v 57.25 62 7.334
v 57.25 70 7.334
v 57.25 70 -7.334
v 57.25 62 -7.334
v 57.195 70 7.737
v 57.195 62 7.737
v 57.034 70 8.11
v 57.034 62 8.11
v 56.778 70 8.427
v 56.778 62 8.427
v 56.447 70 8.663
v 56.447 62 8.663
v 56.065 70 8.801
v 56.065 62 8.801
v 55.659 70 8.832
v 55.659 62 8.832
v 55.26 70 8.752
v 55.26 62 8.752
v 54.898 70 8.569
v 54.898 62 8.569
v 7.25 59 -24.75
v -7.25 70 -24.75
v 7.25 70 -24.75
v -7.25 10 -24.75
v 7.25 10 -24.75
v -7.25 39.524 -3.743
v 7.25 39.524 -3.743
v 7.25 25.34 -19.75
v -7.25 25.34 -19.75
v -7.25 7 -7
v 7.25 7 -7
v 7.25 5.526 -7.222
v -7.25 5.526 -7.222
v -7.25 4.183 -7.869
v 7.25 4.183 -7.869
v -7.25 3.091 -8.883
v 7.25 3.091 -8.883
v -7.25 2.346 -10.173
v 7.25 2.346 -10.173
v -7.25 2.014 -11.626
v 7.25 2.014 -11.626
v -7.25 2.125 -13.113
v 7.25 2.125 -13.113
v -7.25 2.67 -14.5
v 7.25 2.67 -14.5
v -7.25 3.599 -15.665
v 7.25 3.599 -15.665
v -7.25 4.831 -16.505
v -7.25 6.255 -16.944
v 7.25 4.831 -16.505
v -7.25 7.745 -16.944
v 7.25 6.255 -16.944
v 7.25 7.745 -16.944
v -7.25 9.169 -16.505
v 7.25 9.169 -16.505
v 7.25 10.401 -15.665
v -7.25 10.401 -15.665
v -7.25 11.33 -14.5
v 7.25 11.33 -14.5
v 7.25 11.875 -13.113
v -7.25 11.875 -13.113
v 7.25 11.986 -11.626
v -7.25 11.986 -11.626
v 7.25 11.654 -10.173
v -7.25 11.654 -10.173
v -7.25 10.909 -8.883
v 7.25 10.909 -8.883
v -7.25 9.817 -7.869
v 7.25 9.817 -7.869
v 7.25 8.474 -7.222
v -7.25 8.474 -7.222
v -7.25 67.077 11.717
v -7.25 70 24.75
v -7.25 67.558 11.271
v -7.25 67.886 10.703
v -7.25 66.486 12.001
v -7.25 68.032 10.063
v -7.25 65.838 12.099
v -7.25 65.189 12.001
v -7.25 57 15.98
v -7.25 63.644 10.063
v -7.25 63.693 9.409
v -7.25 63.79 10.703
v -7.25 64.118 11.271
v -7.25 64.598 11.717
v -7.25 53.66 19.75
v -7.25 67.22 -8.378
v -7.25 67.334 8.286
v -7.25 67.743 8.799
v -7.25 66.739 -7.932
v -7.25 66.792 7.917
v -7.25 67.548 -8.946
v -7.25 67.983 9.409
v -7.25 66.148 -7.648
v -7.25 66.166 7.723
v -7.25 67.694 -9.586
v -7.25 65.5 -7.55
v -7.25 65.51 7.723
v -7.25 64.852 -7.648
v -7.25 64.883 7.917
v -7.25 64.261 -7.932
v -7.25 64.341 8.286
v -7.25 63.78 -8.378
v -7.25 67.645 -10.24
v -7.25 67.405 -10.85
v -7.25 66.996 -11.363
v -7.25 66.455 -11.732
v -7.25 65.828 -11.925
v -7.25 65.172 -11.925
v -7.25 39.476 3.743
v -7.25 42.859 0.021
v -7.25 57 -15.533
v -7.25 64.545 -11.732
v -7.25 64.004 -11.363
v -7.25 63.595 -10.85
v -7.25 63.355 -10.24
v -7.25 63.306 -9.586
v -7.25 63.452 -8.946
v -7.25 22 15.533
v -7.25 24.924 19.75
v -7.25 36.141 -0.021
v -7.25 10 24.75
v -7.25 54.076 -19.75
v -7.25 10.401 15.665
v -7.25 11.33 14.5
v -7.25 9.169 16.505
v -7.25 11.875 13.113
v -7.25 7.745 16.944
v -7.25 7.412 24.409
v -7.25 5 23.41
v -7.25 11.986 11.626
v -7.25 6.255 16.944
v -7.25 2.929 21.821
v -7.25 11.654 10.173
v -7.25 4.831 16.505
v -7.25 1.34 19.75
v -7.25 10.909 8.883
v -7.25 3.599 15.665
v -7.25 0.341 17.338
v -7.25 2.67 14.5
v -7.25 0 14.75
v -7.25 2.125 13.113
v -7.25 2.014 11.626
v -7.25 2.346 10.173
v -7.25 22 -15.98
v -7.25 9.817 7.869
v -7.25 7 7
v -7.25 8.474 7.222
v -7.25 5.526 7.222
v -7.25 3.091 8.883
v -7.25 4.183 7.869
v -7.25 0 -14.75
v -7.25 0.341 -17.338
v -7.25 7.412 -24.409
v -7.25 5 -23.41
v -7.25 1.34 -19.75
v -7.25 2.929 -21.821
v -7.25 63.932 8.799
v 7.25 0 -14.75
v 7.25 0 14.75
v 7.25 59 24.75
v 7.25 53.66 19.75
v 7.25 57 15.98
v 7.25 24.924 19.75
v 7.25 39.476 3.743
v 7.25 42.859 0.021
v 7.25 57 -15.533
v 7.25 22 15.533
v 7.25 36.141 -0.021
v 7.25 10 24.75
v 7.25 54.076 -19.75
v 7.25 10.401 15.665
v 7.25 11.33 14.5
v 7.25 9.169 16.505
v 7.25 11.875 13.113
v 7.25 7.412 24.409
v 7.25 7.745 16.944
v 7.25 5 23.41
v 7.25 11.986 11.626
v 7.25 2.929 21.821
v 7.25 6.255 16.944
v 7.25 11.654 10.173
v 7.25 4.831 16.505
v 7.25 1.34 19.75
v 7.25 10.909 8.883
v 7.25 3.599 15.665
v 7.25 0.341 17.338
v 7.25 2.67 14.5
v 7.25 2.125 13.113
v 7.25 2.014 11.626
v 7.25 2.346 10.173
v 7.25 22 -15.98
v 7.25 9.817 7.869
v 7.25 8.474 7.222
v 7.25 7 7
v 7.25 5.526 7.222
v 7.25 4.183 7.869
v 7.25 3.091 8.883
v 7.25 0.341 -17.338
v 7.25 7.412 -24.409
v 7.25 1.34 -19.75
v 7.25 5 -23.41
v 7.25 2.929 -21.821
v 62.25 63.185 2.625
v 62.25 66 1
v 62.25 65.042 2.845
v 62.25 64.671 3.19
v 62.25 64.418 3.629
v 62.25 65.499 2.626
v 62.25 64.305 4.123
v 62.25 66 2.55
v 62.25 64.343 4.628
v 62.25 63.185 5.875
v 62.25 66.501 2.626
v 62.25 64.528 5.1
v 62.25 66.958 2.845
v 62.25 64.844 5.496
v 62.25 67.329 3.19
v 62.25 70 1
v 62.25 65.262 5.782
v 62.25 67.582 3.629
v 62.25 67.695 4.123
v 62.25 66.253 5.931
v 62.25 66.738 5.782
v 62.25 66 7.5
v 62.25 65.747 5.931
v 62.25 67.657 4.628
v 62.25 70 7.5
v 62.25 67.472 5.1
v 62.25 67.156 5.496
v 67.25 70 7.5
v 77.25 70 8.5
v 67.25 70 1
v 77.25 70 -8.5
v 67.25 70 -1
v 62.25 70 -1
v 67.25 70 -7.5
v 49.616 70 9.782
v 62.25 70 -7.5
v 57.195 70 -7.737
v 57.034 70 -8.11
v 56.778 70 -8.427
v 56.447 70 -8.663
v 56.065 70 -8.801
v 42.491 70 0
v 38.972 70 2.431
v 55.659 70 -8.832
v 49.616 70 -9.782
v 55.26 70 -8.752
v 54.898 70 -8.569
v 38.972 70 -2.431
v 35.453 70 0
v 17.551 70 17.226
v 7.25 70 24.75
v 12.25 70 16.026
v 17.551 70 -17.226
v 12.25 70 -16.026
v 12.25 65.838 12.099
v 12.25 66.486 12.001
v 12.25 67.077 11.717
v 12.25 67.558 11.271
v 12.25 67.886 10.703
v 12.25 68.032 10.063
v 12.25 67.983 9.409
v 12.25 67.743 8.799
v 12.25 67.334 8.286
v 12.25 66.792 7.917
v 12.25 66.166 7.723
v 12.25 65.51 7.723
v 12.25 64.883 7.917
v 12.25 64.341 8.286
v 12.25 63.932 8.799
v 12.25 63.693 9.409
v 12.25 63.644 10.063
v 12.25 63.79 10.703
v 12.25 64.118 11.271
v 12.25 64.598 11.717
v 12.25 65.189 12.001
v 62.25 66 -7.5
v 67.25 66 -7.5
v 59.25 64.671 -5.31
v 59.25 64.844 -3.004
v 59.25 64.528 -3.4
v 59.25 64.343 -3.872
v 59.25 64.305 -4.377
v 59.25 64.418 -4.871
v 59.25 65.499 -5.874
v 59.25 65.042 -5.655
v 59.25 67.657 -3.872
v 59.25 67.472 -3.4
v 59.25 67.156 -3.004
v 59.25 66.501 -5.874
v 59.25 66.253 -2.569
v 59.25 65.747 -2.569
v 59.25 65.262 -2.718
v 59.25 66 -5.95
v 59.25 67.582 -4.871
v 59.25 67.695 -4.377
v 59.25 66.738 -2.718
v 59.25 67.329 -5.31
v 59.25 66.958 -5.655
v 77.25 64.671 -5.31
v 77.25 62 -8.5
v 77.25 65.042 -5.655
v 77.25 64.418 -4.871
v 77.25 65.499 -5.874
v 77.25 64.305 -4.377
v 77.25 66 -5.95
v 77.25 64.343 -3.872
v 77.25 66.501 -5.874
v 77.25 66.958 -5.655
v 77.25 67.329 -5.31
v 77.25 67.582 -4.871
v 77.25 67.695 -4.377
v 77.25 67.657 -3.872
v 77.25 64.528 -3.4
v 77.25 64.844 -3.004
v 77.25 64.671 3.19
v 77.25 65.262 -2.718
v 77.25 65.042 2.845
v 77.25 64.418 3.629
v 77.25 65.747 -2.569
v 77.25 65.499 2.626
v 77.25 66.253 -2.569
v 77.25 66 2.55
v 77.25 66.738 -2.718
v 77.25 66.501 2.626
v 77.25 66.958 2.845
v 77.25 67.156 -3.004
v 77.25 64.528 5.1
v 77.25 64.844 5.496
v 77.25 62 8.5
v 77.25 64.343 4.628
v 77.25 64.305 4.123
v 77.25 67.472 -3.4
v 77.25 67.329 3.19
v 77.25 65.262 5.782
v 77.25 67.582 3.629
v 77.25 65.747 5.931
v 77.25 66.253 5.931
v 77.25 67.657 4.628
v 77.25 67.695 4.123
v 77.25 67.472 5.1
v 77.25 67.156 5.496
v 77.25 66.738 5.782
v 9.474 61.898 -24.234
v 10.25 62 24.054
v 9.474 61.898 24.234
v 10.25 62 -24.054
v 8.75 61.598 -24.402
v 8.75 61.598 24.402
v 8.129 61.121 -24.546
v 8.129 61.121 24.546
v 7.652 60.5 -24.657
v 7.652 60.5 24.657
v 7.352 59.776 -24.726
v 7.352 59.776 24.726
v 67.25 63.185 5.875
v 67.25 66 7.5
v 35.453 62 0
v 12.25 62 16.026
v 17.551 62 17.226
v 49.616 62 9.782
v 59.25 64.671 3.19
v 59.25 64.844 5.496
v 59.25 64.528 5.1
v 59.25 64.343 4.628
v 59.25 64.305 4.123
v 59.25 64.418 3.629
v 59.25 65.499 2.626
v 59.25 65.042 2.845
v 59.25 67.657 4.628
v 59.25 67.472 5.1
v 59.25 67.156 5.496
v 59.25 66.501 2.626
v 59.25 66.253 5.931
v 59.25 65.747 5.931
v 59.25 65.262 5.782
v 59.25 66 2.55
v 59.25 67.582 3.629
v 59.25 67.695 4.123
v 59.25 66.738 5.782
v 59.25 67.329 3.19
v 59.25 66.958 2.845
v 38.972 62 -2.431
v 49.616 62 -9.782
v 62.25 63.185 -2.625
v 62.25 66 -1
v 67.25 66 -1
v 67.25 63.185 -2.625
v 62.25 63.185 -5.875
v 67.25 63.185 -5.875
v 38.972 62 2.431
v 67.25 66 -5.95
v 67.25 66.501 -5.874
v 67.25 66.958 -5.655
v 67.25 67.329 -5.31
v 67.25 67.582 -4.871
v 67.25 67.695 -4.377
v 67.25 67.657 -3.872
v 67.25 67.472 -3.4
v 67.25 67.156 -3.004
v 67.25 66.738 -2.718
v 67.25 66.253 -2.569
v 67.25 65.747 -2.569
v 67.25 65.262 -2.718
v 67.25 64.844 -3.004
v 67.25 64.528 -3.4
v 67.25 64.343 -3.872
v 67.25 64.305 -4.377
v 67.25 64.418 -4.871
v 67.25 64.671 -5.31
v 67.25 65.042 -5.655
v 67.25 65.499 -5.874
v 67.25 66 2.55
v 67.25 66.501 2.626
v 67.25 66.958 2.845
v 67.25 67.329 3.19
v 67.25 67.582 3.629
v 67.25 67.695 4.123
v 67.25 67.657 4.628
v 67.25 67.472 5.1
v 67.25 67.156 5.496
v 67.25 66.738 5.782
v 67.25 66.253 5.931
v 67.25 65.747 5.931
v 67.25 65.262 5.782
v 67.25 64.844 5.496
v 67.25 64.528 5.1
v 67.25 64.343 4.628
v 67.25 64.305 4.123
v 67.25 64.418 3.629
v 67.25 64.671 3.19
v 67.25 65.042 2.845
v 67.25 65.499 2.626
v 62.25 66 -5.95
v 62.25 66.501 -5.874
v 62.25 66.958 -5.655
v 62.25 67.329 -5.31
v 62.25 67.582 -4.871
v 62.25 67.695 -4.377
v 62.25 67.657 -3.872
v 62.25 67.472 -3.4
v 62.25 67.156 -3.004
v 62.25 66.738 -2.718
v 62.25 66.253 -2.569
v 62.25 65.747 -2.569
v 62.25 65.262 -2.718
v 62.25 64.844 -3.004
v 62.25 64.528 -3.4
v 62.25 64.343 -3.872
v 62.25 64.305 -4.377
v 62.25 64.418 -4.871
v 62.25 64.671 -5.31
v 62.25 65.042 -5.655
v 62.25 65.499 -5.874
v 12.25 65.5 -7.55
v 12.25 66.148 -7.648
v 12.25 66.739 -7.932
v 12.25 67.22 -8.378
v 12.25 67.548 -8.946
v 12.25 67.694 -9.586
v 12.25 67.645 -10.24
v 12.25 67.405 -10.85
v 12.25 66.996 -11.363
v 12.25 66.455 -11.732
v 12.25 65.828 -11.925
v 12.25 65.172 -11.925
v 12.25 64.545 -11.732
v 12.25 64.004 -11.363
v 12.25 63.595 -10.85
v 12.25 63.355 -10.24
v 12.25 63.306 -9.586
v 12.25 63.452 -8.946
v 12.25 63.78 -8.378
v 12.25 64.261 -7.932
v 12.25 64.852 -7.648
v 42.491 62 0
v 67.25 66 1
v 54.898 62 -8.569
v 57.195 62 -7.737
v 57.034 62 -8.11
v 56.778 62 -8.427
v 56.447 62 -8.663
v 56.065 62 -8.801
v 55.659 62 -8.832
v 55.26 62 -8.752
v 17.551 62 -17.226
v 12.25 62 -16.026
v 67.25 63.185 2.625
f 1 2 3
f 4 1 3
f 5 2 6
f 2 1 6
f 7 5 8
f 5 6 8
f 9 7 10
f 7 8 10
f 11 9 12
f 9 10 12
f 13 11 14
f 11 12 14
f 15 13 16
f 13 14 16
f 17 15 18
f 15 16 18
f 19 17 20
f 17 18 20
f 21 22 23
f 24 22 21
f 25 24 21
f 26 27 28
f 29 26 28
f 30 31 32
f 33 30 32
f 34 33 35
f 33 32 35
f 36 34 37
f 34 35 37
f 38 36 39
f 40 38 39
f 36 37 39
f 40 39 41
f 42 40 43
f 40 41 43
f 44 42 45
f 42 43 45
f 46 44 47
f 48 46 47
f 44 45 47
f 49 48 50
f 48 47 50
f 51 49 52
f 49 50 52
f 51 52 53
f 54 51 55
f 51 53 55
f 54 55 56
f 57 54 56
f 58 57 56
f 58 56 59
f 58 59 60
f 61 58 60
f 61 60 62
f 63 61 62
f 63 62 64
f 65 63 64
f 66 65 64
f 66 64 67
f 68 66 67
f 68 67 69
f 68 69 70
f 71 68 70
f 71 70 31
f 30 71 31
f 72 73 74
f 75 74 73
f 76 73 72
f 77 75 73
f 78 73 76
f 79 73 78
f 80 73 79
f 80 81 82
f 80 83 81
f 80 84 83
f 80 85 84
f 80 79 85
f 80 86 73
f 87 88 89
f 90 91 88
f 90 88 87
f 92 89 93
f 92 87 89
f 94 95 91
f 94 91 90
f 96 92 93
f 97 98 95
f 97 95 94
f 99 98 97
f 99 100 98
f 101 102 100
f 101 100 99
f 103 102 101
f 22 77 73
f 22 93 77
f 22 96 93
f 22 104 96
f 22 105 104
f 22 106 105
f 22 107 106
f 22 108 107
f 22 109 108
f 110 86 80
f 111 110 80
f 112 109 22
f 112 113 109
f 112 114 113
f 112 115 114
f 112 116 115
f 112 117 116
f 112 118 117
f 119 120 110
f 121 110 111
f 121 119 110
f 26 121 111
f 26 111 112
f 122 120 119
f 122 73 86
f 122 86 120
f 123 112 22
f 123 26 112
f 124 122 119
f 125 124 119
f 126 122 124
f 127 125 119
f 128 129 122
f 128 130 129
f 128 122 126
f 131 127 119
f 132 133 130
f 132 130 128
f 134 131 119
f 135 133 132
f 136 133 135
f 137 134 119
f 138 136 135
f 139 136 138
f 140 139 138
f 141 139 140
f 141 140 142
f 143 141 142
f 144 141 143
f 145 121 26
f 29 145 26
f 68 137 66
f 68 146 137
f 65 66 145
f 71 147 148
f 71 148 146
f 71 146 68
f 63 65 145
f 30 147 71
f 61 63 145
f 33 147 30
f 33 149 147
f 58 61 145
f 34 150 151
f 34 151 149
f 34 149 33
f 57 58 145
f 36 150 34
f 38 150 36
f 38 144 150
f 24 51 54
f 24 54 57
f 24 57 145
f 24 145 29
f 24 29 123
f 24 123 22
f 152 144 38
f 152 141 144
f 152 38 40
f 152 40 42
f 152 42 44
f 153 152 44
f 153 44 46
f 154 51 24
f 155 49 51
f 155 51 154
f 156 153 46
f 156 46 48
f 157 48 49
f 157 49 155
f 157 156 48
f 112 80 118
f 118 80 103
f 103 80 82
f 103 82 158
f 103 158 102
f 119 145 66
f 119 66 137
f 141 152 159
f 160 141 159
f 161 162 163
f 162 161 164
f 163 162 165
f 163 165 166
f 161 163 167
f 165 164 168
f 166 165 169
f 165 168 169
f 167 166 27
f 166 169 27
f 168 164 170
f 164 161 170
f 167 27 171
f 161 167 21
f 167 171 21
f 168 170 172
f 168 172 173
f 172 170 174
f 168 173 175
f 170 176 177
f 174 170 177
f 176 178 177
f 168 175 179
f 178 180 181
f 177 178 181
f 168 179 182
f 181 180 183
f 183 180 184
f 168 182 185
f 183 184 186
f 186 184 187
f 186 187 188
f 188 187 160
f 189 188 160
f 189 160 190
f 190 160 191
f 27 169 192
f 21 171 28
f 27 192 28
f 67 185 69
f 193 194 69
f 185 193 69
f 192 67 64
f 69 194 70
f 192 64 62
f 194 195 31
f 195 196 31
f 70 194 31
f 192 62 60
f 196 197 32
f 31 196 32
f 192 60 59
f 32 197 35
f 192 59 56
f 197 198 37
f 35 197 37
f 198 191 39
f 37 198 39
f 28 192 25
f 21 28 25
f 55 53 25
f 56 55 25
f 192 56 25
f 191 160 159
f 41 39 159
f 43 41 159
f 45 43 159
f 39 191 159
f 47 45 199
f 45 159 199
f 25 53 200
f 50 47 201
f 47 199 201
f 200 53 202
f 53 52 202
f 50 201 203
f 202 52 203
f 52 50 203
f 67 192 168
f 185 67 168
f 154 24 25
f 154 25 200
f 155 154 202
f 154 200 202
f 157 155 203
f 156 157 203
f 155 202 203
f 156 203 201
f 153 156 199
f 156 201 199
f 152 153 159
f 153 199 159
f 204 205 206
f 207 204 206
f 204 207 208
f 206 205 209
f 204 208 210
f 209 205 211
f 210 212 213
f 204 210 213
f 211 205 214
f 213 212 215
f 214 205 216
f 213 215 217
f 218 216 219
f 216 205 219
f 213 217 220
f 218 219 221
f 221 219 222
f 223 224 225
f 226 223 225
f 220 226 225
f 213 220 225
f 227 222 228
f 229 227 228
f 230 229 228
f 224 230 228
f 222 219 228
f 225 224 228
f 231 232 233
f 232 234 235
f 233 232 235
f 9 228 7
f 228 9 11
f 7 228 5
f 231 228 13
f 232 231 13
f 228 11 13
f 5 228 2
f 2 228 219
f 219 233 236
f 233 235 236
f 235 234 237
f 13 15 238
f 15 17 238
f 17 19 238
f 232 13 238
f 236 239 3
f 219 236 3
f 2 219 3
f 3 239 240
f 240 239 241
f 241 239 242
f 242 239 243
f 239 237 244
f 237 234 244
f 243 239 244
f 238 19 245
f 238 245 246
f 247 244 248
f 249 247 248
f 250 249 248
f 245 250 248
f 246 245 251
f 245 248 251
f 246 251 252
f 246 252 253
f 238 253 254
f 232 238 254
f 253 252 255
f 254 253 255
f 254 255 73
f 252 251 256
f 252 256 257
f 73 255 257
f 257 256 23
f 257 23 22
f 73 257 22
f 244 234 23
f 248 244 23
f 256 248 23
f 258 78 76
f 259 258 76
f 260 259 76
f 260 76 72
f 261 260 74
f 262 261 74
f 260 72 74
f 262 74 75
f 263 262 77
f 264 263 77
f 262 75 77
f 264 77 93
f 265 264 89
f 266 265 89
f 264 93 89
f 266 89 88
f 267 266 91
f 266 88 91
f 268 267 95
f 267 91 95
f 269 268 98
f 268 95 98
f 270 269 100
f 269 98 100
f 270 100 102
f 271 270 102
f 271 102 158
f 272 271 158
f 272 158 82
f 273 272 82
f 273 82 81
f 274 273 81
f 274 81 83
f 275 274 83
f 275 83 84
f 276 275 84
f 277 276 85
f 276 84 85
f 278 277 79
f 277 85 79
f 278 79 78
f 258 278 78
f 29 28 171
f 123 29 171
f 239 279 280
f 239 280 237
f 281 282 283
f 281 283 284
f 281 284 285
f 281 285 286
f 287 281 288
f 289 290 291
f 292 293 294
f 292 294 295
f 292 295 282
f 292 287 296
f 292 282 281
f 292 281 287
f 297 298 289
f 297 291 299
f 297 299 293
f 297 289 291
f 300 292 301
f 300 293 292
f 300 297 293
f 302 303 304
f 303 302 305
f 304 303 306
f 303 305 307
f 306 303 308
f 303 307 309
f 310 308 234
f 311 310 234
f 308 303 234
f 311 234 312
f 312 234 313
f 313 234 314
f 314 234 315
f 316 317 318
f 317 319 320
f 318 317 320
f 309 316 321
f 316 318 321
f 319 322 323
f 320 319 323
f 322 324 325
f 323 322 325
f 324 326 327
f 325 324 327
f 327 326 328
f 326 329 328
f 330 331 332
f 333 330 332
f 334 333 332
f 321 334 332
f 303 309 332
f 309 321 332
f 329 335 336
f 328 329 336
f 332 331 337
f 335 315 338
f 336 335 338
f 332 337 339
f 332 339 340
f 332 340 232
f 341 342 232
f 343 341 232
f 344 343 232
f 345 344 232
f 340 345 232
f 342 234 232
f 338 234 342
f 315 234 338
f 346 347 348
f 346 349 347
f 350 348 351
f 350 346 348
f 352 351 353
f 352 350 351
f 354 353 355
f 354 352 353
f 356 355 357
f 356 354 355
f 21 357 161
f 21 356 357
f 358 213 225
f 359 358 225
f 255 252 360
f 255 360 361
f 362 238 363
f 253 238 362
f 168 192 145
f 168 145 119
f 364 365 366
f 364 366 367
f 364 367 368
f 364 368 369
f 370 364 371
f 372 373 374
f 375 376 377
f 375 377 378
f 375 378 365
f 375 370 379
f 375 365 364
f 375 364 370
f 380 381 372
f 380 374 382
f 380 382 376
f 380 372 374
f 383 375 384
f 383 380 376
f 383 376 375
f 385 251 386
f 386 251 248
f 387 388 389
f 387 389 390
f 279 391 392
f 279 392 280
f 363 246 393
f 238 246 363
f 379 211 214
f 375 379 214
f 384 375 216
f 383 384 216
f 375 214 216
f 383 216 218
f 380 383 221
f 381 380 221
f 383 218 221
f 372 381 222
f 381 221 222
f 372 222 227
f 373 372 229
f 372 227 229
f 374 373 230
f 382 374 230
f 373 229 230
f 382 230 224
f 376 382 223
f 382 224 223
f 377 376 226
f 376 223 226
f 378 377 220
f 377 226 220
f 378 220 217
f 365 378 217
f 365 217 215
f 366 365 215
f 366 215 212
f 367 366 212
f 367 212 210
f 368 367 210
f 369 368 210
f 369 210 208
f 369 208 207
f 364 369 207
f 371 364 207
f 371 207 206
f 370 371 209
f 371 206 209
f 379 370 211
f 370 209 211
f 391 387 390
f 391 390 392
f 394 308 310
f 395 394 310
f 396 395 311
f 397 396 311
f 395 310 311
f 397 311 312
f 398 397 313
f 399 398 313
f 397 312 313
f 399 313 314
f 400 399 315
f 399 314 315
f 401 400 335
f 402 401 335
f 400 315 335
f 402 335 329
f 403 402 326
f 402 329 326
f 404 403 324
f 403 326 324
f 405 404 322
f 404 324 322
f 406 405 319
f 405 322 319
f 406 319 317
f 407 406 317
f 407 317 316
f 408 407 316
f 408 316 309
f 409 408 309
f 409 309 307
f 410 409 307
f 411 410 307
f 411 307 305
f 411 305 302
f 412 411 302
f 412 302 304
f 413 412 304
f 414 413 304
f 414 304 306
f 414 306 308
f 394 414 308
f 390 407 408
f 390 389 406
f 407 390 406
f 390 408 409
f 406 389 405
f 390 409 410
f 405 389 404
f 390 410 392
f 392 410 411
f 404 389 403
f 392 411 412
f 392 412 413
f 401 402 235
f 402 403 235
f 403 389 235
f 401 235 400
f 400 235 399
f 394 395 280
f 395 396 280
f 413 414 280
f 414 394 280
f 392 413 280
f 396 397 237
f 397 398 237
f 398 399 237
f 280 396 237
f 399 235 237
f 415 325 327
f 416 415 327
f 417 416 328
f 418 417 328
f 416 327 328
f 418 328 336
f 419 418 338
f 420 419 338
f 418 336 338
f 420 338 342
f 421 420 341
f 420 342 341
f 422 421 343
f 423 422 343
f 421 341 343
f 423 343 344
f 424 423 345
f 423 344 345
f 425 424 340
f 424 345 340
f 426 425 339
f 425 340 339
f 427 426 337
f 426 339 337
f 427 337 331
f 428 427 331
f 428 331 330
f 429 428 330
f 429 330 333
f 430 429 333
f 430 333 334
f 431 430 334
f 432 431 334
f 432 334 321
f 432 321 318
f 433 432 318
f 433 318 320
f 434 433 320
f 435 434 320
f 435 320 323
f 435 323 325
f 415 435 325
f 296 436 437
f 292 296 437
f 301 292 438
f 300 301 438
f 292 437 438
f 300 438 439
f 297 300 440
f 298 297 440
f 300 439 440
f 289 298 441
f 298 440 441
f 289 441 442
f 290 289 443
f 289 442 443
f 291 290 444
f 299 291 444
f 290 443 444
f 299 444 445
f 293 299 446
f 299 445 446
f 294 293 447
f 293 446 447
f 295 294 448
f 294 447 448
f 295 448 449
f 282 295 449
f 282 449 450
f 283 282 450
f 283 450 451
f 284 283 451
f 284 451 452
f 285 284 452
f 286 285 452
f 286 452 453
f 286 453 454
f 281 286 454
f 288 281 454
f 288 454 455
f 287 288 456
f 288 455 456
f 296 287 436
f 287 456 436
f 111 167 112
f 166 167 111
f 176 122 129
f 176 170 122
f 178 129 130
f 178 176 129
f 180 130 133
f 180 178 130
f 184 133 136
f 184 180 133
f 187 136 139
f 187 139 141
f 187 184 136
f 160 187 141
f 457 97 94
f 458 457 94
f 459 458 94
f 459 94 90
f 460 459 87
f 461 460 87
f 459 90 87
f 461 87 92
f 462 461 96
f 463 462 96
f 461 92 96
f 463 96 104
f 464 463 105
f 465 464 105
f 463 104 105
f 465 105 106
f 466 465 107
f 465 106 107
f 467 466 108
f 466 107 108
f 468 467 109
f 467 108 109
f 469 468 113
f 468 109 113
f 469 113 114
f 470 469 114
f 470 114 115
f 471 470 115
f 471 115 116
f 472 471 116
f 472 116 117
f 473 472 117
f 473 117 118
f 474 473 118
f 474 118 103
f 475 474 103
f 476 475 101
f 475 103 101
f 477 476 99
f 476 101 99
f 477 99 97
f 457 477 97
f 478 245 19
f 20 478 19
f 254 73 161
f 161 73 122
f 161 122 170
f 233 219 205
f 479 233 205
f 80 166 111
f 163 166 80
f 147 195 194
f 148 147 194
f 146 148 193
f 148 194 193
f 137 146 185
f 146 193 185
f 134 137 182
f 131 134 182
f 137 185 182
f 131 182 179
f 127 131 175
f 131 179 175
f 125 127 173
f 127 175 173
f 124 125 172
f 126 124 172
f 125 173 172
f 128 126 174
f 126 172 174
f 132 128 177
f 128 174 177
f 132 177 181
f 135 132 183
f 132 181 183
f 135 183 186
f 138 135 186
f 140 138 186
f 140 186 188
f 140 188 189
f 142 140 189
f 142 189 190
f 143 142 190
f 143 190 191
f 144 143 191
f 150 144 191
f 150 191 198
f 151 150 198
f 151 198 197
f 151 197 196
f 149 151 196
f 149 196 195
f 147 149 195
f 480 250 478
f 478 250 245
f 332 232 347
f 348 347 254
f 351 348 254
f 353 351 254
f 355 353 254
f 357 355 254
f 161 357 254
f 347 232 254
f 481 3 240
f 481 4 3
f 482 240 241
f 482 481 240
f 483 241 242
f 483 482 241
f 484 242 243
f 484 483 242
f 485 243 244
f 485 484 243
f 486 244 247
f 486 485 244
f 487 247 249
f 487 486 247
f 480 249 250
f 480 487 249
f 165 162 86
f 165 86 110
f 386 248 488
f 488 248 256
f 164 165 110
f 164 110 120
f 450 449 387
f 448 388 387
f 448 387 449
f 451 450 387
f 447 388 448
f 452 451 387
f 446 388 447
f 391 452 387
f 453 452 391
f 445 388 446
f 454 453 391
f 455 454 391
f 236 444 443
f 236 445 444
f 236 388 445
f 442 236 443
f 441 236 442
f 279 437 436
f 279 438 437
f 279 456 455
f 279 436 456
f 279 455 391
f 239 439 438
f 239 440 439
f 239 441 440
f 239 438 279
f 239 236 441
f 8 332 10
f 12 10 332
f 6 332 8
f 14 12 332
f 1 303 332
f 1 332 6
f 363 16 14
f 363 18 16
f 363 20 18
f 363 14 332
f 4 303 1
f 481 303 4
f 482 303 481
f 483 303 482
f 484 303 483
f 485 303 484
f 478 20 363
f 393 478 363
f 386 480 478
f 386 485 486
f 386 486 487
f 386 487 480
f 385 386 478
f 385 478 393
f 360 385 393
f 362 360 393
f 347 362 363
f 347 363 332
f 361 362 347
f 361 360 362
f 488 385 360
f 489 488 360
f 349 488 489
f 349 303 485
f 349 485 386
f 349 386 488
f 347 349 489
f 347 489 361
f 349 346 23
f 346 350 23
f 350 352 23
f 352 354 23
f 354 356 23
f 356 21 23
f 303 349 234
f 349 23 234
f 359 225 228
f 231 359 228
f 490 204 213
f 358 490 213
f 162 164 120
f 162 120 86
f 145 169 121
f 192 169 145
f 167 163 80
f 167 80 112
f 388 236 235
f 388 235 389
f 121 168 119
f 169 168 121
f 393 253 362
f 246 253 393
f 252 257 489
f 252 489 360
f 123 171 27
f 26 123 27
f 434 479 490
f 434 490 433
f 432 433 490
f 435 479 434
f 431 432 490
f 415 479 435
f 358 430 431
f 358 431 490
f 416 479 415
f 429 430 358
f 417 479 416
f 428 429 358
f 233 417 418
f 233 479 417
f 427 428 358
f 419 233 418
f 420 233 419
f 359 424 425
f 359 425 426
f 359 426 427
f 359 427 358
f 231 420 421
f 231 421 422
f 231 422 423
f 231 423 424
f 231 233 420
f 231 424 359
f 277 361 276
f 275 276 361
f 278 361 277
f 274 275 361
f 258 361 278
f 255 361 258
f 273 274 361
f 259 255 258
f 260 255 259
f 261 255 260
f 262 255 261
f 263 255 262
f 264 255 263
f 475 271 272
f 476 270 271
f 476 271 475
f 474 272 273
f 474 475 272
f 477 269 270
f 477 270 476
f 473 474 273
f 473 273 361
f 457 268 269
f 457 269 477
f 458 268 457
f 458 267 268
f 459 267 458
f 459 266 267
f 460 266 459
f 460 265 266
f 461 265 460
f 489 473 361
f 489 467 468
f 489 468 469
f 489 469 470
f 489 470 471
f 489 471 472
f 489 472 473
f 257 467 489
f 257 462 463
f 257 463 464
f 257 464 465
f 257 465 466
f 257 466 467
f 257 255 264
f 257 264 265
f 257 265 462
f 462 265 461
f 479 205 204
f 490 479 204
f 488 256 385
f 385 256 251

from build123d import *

# Parameters (mm, degrees)
SKETCH1_W           = 14.5
SKETCH1_H           = 49.5
BOSS_EXTRUDE1_DEPTH = 70
FILLET1_R           = 10
SKETCH2_R           = 5
CUT_EXTRUDE1_DEPTH  = 76.649272964
BOSS_EXTRUDE2_DEPTH = 8
SKETCH5_R           = 1.7
CUT_EXTRUDE2_DEPTH  = 15
CUT_EXTRUDE3_DEPTH  = 5
CUT_EXTRUDE4_DEPTH  = 103.041964407
CUT_EXTRUDE5_DEPTH  = 10
FILLET2_R           = 1.5
FILLET3_R           = 3
SKETCH10_R          = 2.2
CUT_EXTRUDE6_DEPTH  = 19.5
SKETCH11_R          = 1.7
CUT_EXTRUDE7_DEPTH  = 3


with BuildPart() as part:
    # Sketch1 → Boss-Extrude1 (new body)
    with BuildSketch(Plane(origin=(0, 0, 0), x_dir=(1, 0, 0), z_dir=(0, 1, 0))):
        Rectangle(SKETCH1_W, SKETCH1_H)
    extrude(amount=BOSS_EXTRUDE1_DEPTH)

    # Fillet1
    fillet1_edges = [part.edges().sort_by_distance(p)[0] for p in [
        (0, 0, 24.75),
        (0, 0, -24.75),
    ]]
    fillet(fillet1_edges, radius=FILLET1_R)

    # Sketch2 → Cut-Extrude1 (cut, through all)
    with BuildSketch(Plane(origin=(7.25, 0, 0), x_dir=(0, 0, -1), z_dir=(1, 0, 0))):
        with Locations((-12, 7)):
            Circle(SKETCH2_R)
        with Locations(Location((12, 7, 0), (0, 0, 180))):
            Circle(SKETCH2_R)
    extrude(amount=-CUT_EXTRUDE1_DEPTH, mode=Mode.SUBTRACT)

    # Sketch3 → Boss-Extrude2 (add)
    with BuildSketch(Plane(origin=(0, 70, 0), x_dir=(1, 0, 0), z_dir=(0, 1, 0))):
        Polygon((77.25, 8.5), (77.25, -8.5), (7.25, -24.75), (7.25, 24.75), align=None)
    extrude(amount=-BOSS_EXTRUDE2_DEPTH)

    # Sketch5 → Cut-Extrude2 (cut)
    with BuildSketch(Plane(origin=(77.25, 0, 0), x_dir=(0, 0, -1), z_dir=(1, 0, 0))):
        with Locations((-4.25, 66)):
            Circle(SKETCH5_R)
        with Locations((4.25, 66)):
            Circle(SKETCH5_R)
    extrude(amount=-CUT_EXTRUDE2_DEPTH, mode=Mode.SUBTRACT)

    # Sketch7 → Cut-Extrude3 (cut)
    with BuildSketch(Plane(origin=(62.25, 0, 0), x_dir=(0, 0, -1), z_dir=(1, 0, 0))):
        Polygon((-7.5, 66), (-7.5, 70), (-1, 70), (-1, 66), (-2.625, 63.185417438), (-5.875, 63.185417438), align=None)
        Polygon((1, 66), (2.625, 63.185417438), (5.875, 63.185417438), (7.5, 66), (7.5, 70), (1, 70), align=None)
    extrude(amount=CUT_EXTRUDE3_DEPTH, mode=Mode.SUBTRACT)

    # Sketch8 → Cut-Extrude4 (cut, through all)
    with BuildSketch(Plane(origin=(7.25, 0, 0), x_dir=(0, 0, -1), z_dir=(1, 0, 0))):
        Polygon((0.021408878, 36.140810628), (15.98032373, 22), (-15.533482813, 22), align=None)
        Polygon((-19.75, 24.924106533), (-19.75, 53.65978052), (-3.742755965, 39.476146565), align=None)
        Polygon((-15.98032373, 57), (15.533482813, 57), (-0.021408878, 42.859189372), align=None)
        Polygon((19.75, 25.34021948), (19.75, 54.075893467), (3.742755965, 39.523853435), align=None)
    extrude(amount=-CUT_EXTRUDE4_DEPTH, mode=Mode.SUBTRACT)

    # Sketch9 → Cut-Extrude5 (cut)
    with BuildSketch(Plane(origin=(0, 70, 0), x_dir=(1, 0, 0), z_dir=(0, 1, 0))):
        Polygon((35.452952842, 0), (12.25, -16.025665333), (12.25, 16.025665333), align=None)
        Polygon((49.616038971, 9.782068685), (17.550981037, 17.225742848), (38.972216713, 2.430662399), align=None)
        Polygon((57.25, 10.193318694), (42.491480584, 0), (57.25, -10.193318694), align=None)
        Polygon((38.972216713, -2.430662399), (49.616038971, -9.782068685), (17.550981037, -17.225742848), align=None)
    extrude(amount=-CUT_EXTRUDE5_DEPTH, mode=Mode.SUBTRACT)

    # Fillet2
    fillet2_edges = [part.edges().sort_by_distance(p)[0] for p in [
        (57.25, 66, -10.193318694),
        (57.25, 66, 10.193318694),
    ]]
    fillet(fillet2_edges, radius=FILLET2_R)

    # Fillet3
    fillet3_edges = [part.edges().sort_by_distance(p)[0] for p in [
        (7.25, 62, 0),
    ]]
    fillet(fillet3_edges, radius=FILLET3_R)

    # Sketch10 → Cut-Extrude6 (cut)
    with BuildSketch(Plane.ZY.offset(7.25)):
        with Locations((-9.75, 65.5)):
            Circle(SKETCH10_R)
        with Locations((9.898872111, 65.837689232)):
            Circle(SKETCH10_R)
    extrude(amount=-CUT_EXTRUDE6_DEPTH, mode=Mode.SUBTRACT)

    # Sketch11 → Cut-Extrude7 (cut)
    with BuildSketch(Plane(origin=(62.25, 0, 0), x_dir=(0, 0, -1), z_dir=(1, 0, 0))):
        with Locations((4.25, 66)):
            Circle(SKETCH11_R)
        with Locations((-4.25, 66)):
            Circle(SKETCH11_R)
    extrude(amount=-CUT_EXTRUDE7_DEPTH, mode=Mode.SUBTRACT)


solid = part.part
